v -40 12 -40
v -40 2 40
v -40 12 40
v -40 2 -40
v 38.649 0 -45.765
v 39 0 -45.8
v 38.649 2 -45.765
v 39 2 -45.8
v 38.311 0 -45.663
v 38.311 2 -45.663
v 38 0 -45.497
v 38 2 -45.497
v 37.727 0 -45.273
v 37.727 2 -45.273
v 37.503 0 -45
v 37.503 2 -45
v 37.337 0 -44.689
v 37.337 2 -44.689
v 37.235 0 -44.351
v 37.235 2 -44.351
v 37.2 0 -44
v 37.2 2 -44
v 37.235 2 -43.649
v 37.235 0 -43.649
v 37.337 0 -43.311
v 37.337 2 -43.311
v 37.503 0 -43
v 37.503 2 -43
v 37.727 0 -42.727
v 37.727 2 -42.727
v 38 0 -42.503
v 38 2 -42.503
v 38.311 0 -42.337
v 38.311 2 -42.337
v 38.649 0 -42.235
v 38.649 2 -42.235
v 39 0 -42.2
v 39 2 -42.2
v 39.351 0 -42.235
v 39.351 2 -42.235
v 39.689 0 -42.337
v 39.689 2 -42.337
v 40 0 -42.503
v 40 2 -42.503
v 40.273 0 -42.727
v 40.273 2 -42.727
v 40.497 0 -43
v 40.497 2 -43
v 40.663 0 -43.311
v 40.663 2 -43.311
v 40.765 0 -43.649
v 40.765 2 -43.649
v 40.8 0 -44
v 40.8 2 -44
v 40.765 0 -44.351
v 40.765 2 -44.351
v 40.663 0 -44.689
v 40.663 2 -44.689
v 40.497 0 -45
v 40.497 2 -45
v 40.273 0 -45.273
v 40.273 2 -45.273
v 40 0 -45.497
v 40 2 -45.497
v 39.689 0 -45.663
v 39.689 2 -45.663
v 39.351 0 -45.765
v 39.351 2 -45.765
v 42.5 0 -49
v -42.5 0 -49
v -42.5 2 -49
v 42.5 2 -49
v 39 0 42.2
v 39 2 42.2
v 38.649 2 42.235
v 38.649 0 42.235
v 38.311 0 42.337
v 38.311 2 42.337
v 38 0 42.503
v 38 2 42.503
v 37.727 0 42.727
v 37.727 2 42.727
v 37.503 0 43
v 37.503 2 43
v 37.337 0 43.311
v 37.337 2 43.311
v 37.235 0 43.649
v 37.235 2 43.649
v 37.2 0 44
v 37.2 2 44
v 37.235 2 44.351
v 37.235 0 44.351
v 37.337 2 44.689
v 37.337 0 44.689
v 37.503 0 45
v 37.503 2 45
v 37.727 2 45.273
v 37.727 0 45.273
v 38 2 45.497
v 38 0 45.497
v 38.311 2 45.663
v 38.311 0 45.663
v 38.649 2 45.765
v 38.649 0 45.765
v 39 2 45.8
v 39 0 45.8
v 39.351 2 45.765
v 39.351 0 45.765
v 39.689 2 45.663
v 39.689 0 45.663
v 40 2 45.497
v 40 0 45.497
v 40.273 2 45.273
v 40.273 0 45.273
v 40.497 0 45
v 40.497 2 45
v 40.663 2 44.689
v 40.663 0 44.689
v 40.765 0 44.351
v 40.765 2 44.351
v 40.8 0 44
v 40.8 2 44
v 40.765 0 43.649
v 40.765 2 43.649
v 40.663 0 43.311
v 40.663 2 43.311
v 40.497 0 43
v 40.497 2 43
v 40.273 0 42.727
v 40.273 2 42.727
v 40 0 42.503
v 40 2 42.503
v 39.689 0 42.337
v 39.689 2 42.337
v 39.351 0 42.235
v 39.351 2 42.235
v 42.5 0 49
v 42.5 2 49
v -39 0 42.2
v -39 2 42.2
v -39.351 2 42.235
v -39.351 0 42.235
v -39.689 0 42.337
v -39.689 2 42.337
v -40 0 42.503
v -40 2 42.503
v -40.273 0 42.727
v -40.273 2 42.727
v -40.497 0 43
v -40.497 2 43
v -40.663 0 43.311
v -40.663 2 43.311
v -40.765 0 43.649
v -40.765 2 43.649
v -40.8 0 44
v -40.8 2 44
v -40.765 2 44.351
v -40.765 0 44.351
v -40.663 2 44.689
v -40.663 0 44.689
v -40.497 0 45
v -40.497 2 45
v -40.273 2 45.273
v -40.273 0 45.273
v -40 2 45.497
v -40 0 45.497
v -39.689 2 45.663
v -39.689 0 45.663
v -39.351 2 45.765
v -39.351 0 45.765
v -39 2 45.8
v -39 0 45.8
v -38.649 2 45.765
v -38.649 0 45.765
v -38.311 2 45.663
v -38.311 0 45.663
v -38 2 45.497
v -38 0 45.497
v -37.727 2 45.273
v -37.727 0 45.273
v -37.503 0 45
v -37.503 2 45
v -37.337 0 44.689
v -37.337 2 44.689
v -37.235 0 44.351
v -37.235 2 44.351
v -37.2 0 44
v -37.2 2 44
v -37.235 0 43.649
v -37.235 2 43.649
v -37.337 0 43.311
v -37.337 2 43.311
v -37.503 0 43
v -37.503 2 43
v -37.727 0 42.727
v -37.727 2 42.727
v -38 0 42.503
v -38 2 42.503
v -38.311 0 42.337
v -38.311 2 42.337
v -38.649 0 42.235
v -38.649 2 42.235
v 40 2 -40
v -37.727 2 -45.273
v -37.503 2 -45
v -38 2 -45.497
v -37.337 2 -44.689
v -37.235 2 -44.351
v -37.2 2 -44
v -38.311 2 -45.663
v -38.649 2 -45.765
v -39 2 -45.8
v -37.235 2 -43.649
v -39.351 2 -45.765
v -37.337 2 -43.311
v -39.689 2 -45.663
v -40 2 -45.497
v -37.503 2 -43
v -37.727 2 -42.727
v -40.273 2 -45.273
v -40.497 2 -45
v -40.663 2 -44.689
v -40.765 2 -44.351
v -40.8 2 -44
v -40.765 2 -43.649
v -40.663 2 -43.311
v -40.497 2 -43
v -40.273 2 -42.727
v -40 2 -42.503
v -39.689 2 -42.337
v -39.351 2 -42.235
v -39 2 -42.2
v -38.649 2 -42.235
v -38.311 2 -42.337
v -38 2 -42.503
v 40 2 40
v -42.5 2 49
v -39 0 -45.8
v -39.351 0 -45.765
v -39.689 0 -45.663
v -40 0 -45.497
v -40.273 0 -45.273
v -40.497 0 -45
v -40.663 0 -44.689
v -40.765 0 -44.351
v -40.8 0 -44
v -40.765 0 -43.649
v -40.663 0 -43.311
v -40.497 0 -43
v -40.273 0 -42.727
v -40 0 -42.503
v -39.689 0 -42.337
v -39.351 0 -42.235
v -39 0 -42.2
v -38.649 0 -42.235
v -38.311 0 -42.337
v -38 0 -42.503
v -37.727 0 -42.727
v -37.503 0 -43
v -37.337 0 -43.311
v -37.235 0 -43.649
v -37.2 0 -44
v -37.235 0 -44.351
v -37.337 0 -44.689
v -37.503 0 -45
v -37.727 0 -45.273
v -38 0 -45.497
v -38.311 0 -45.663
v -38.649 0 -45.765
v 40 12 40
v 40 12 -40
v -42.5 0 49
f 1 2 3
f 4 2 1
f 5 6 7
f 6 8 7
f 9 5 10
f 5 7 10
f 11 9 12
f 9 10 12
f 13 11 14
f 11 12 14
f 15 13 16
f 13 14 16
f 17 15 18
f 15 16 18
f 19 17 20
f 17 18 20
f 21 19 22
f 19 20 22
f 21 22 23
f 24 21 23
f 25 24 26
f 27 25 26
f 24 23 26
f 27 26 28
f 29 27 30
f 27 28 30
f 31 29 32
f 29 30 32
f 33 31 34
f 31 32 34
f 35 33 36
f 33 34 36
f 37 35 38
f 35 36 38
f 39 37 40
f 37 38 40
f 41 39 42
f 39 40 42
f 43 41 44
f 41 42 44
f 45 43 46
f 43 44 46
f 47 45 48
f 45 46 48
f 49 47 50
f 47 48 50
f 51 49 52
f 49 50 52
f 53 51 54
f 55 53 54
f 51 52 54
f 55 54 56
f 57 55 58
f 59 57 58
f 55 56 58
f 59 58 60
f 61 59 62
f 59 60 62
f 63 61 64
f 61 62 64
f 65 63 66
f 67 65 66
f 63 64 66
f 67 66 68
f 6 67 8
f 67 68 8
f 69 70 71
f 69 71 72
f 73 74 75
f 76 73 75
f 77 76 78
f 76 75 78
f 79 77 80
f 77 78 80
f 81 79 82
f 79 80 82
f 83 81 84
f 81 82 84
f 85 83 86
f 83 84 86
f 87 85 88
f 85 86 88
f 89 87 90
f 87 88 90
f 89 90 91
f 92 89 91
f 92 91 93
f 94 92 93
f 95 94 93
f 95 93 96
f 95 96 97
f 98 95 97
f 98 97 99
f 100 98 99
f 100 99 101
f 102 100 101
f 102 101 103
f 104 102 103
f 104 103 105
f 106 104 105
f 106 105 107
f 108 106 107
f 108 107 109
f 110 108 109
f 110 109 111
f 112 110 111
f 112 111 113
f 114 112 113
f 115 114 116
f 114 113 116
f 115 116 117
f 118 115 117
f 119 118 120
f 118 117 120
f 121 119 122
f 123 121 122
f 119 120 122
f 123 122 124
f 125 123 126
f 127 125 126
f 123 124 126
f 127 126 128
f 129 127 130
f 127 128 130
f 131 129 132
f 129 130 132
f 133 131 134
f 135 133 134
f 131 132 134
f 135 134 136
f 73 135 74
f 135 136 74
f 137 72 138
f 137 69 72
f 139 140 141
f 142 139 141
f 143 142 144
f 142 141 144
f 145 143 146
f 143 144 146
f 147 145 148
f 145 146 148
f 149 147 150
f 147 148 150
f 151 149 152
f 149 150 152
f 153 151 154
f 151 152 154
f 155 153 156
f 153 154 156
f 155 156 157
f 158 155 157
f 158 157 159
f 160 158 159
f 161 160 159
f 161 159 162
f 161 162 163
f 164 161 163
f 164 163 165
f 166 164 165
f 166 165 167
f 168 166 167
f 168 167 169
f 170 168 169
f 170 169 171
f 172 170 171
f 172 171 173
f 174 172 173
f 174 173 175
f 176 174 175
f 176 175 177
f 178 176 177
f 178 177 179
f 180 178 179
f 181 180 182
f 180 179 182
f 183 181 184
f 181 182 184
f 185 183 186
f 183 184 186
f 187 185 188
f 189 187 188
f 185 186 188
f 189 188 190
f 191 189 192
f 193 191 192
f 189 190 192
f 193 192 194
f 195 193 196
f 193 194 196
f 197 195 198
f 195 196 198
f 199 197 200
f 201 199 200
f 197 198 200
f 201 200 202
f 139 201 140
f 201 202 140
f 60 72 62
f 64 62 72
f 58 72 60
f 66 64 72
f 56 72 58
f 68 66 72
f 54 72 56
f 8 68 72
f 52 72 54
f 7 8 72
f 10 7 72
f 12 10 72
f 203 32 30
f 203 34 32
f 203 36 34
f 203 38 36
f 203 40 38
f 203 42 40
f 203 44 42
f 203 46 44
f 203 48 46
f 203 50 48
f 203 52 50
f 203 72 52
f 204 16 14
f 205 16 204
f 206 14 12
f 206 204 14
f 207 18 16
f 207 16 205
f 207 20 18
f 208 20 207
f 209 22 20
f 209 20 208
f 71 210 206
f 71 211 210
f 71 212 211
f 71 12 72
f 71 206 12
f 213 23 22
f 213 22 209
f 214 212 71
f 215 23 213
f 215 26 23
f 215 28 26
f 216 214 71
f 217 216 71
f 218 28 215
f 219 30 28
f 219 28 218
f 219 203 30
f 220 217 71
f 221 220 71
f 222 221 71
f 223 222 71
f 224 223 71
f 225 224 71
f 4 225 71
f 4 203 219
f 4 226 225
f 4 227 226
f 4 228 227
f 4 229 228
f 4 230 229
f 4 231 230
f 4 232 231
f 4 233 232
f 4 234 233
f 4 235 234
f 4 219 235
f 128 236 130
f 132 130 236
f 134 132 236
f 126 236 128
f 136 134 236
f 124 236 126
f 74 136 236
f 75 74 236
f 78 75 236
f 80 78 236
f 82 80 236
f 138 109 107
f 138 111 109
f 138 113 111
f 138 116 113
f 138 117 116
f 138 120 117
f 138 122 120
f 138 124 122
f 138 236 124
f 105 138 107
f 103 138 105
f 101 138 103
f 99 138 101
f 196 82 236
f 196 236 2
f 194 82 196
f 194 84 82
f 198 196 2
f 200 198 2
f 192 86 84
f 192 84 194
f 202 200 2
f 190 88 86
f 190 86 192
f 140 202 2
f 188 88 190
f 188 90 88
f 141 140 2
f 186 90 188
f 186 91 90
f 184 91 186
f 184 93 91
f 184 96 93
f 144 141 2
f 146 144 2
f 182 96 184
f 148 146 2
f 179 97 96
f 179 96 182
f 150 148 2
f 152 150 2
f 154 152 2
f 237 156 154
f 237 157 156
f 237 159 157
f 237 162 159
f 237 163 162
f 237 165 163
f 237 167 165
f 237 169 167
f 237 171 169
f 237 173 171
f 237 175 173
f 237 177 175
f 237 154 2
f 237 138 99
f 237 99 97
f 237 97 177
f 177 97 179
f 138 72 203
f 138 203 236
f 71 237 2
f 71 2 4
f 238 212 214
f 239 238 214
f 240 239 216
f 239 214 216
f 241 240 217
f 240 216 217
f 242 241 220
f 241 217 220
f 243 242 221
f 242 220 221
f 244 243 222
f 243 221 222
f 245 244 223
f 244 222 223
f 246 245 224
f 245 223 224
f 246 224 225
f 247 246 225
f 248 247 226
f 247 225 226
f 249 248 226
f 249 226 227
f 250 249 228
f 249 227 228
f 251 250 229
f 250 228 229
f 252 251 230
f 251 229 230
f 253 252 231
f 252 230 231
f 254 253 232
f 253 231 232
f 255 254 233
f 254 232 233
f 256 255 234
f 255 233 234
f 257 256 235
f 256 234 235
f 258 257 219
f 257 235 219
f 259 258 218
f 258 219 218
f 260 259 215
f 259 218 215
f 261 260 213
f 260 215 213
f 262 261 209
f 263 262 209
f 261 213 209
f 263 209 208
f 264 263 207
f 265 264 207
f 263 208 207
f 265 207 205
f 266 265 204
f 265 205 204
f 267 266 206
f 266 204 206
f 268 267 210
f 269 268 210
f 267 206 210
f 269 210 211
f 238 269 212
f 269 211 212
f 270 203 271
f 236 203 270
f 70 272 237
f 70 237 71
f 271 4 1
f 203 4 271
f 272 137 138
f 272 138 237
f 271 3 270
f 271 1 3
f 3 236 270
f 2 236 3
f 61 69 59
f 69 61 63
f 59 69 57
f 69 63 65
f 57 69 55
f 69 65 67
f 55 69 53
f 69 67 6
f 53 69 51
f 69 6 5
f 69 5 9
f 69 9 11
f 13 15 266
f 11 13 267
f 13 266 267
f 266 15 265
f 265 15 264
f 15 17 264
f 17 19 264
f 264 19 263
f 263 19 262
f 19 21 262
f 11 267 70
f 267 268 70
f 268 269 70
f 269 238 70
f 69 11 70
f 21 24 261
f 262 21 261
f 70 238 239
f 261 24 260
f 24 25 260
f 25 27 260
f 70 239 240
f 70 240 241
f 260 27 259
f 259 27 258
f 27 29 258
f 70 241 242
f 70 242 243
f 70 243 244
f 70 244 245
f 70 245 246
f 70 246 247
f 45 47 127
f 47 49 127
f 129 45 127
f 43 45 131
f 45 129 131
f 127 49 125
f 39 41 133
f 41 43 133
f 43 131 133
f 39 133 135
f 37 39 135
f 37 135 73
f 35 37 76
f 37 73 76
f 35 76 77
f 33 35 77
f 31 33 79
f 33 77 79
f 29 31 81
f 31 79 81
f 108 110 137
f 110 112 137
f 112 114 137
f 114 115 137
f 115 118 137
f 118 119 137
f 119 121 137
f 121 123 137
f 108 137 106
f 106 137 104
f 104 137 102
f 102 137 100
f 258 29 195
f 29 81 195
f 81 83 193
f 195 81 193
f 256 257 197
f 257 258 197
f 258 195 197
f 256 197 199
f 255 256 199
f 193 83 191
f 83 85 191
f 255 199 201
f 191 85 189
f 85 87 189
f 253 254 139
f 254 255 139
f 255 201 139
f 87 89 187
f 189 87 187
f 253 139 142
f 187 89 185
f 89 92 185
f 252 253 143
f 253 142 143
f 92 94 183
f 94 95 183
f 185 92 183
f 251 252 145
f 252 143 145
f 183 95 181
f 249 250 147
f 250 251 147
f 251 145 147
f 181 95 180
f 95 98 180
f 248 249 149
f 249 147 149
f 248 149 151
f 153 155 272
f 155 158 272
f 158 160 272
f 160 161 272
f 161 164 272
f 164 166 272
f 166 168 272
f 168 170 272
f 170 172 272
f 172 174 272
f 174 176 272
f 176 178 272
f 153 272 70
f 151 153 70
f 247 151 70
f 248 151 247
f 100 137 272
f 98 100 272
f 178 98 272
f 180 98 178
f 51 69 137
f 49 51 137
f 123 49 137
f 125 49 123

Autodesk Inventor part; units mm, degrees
ref_plane "YZ Plane" through (0, 0, 0) normal (1, 0, 0) x (0, 1, 0)
ref_plane "XZ Plane" through (0, 0, 0) normal (0, 1, 0) x (-1, 0, 0)
ref_plane "XY Plane" through (0, 0, 0) normal (0, 0, 1) x (1, 0, 0)
sketch "Sketch1" plane through (0, 0, 0) normal (0, 1, 0) x (-1, 0, 0)
  line L0 (-42.5, 49) -> (42.5, 49)
  line L1 (42.5, 49) -> (42.5, -49)
  line L2 (42.5, -49) -> (-42.5, -49)
  line L3 (-42.5, -49) -> (-42.5, 49)
  line L4 (-42.5, 49) -> (42.5, -49) construction
  line L5 (42.5, 49) -> (-42.5, -49) construction
  line L6 (-39, 44) -> (39, 44) construction
  line L7 (39, 44) -> (39, -44) construction
  line L8 (39, -44) -> (-39, -44) construction
  line L9 (-39, -44) -> (-39, 44) construction
  line L10 (-39, 44) -> (39, -44) construction
  line L11 (39, 44) -> (-39, -44) construction
  point P0 (0, 0)
  dimension "d0" = 85
  dimension "d1" = 98
  dimension "d2" = 78
  dimension "d3" = 88
extrude "Extrusion1" add sketch "Sketch1" along normal blind 2
hole "Hole1" at (39, 0, 44) at (39, 0, -44) at (-39, 0, -44) at (-39, 0, 44) direction (0, 1, 0) diameter 3.6 end through all clearance for "Socket Head Cap Screw ISO 4762" size "M3" standard "ISO"
sketch "Sketch2" plane through (0, 2, 0) normal (0, 1, 0) x (1, 0, 0)
  line L0 (40, -40) -> (-40, -40)
  line L1 (-40, -40) -> (-40, 40)
  line L2 (-40, 40) -> (40, 40)
  line L3 (40, 40) -> (40, -40)
  line L4 (40, -40) -> (-40, 40) construction
  line L5 (-40, -40) -> (40, 40) construction
  point P0 (0, 0)
  dimension "d13" = 80
  dimension "d14" = 80
extrude "Extrusion2" add sketch "Sketch2" along normal blind 10
properties part number "mainboard"
